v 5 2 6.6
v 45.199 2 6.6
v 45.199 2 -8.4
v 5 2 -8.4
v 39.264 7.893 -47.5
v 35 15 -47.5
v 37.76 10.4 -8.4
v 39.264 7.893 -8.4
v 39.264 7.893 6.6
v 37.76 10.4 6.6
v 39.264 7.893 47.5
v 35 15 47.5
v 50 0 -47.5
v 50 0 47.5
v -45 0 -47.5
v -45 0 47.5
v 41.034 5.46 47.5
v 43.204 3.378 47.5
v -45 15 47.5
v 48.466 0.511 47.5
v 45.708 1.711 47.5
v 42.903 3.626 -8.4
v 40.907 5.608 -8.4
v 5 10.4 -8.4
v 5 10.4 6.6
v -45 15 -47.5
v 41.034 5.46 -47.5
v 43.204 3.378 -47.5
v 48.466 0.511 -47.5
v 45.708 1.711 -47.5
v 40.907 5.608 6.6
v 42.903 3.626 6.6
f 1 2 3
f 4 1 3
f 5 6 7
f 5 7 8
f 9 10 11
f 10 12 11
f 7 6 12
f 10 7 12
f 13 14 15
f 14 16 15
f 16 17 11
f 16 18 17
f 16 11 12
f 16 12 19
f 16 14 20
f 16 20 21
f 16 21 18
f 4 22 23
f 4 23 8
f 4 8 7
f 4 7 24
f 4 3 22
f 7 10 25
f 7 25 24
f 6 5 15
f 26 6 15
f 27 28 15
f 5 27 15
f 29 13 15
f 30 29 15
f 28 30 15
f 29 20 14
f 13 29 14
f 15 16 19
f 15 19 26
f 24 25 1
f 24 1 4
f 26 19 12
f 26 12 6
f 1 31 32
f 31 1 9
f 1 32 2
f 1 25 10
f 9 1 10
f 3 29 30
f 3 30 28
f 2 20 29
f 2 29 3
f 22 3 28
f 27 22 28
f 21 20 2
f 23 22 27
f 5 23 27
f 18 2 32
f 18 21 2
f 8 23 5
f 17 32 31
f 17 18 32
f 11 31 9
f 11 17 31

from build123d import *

# Parameters (mm, degrees)
SKETCH1_W           = 90
SKETCH1_H           = 95
BOSS_EXTRUDE3_DEPTH = 15
SKETCH5_W           = 15
SKETCH5_H           = 8.4
CUT_EXTRUDE3_DEPTH  = 40
SKETCH7_W           = 95
SKETCH7_H           = 15
BOSS_EXTRUDE4_DEPTH = 5
CUT_EXTRUDE4_DEPTH  = 100
FILLET6_R           = 17


with BuildPart() as part:
    # Sketch1 → Boss-Extrude3 (new body)
    with BuildSketch(Plane(origin=(0, 0, 0), x_dir=(1, 0, 0), z_dir=(0, 1, 0))):
        Rectangle(SKETCH1_W, SKETCH1_H)
    extrude(amount=BOSS_EXTRUDE3_DEPTH)

    # Sketch5 → Cut-Extrude3 (cut)
    with BuildSketch(Plane(origin=(45, 0, 0), x_dir=(0, 0, -1), z_dir=(1, 0, 0))):
        with Locations((0.9, 6.2)):
            Rectangle(SKETCH5_W, SKETCH5_H)
    extrude(amount=-CUT_EXTRUDE3_DEPTH, mode=Mode.SUBTRACT)

    # Sketch7 → Boss-Extrude4 (add)
    with BuildSketch(Plane(origin=(45, 0, 0), x_dir=(0, 0, -1), z_dir=(1, 0, 0))):
        with Locations((0, 7.5)):
            Rectangle(SKETCH7_W, SKETCH7_H)
    extrude(amount=BOSS_EXTRUDE4_DEPTH)

    # Sketch8 → Cut-Extrude4 (cut)
    with BuildSketch(Plane.XY.offset(47.5)):
        Polygon((42.5, 2.5), (50, 0), (50, 15), (35, 15), align=None)
    extrude(amount=-CUT_EXTRUDE4_DEPTH, mode=Mode.SUBTRACT)

    # Fillet6
    # the kernel refuses this fillet: 17 mm, written as the material it adds along each edge
    with BuildSketch(Plane(origin=(42.5, 2.5, 7.321773239), x_dir=(0.9486832980505139, -0.316227766016838, 0), z_dir=(0, 0, -1))) as fillet6_piece_1_section:
        with BuildLine():
            CenterArc((FILLET6_R * 0.369924076215, -FILLET6_R), FILLET6_R, 90, 40.601294645)
            Line((-FILLET6_R * 0.28086729724, -FILLET6_R * 0.240743397635), (0, 0))
            Line((0, 0), (FILLET6_R * 0.369924076215, 0))
        make_face()
    fillet6_piece_1 = extrude(amount=54.821773239, mode=Mode.PRIVATE)
    fillet6_piece_1 = split(fillet6_piece_1, bisect_by=Plane(origin=(45.830299546, 2, 6.96088662), z_dir=(0, -1, 0)), keep=Keep.TOP, mode=Mode.PRIVATE)
    fillet6_piece_1 = split(fillet6_piece_1, bisect_by=Plane(origin=(45.830299546, 1.289116615, 6.6), z_dir=(0, 0, 1)), keep=Keep.TOP, mode=Mode.PRIVATE)
    add(fillet6_piece_1)
    with BuildSketch(Plane(origin=(42.5, 2.5, 7.321773239), x_dir=(0.9486832980505139, -0.316227766016838, 0), z_dir=(0, 0, -1))) as fillet6_piece_2_section:
        with BuildLine():
            CenterArc((FILLET6_R * 0.369924076215, -FILLET6_R), FILLET6_R, 90, 40.601294645)
            Line((-FILLET6_R * 0.28086729724, -FILLET6_R * 0.240743397635), (0, 0))
            Line((0, 0), (FILLET6_R * 0.369924076215, 0))
        make_face()
    fillet6_piece_2 = extrude(amount=54.821773239, mode=Mode.PRIVATE)
    fillet6_piece_2 = split(fillet6_piece_2, bisect_by=Plane(origin=(42.01228151, 2, 6.96088662), z_dir=(0, 1, 0)), keep=Keep.TOP, mode=Mode.PRIVATE)
    fillet6_piece_2 = split(fillet6_piece_2, bisect_by=Plane(origin=(42.01228151, 3.937960854, 6.6), z_dir=(0, 0, 1)), keep=Keep.TOP, mode=Mode.PRIVATE)
    add(fillet6_piece_2)
    with BuildSketch(Plane(origin=(42.5, 2.5, 7.321773239), x_dir=(0.9486832980505139, -0.316227766016838, 0), z_dir=(0, 0, -1))) as fillet6_piece_3_section:
        with BuildLine():
            CenterArc((FILLET6_R * 0.369924076215, -FILLET6_R), FILLET6_R, 90, 40.601294645)
            Line((-FILLET6_R * 0.28086729724, -FILLET6_R * 0.240743397635), (0, 0))
            Line((0, 0), (FILLET6_R * 0.369924076215, 0))
        make_face()
    fillet6_piece_3 = extrude(amount=54.821773239, mode=Mode.PRIVATE)
    fillet6_piece_3 = split(fillet6_piece_3, bisect_by=Plane(origin=(45.830299546, 1.289116615, -8.4), z_dir=(0, 0, 1)), keep=Keep.TOP, mode=Mode.PRIVATE)
    fillet6_piece_3 = split(fillet6_piece_3, bisect_by=Plane(origin=(45.830299546, 2, -0.9), z_dir=(0, -1, 0)), keep=Keep.TOP, mode=Mode.PRIVATE)
    fillet6_piece_3 = split(fillet6_piece_3, bisect_by=Plane(origin=(45.830299546, 1.289116615, 6.6), z_dir=(0, 0, -1)), keep=Keep.TOP, mode=Mode.PRIVATE)
    add(fillet6_piece_3)
    with BuildSketch(Plane(origin=(42.5, 2.5, -8.4), x_dir=(0.9486832980505139, -0.316227766016838, 0), z_dir=(0, 0, -1))) as fillet6_piece_4_section:
        with BuildLine():
            CenterArc((FILLET6_R * 0.369924076215, -FILLET6_R), FILLET6_R, 90, 40.601294645)
            Line((-FILLET6_R * 0.28086729724, -FILLET6_R * 0.240743397635), (0, 0))
            Line((0, 0), (FILLET6_R * 0.369924076215, 0))
        make_face()
    fillet6_piece_4 = extrude(amount=39.1, mode=Mode.PRIVATE)
    fillet6_piece_4 = split(fillet6_piece_4, bisect_by=Plane(origin=(45.830299546, 2, -27.95), z_dir=(0, -1, 0)), keep=Keep.TOP, mode=Mode.PRIVATE)
    add(fillet6_piece_4)
    with BuildSketch(Plane(origin=(42.5, 2.5, -8.4), x_dir=(0.9486832980505139, -0.316227766016838, 0), z_dir=(0, 0, -1))) as fillet6_piece_5_section:
        with BuildLine():
            CenterArc((FILLET6_R * 0.369924076215, -FILLET6_R), FILLET6_R, 90, 40.601294645)
            Line((-FILLET6_R * 0.28086729724, -FILLET6_R * 0.240743397635), (0, 0))
            Line((0, 0), (FILLET6_R * 0.369924076215, 0))
        make_face()
    fillet6_piece_5 = extrude(amount=39.1, mode=Mode.PRIVATE)
    fillet6_piece_5 = split(fillet6_piece_5, bisect_by=Plane(origin=(42.01228151, 2, -27.95), z_dir=(0, 1, 0)), keep=Keep.TOP, mode=Mode.PRIVATE)
    add(fillet6_piece_5)
    with BuildSketch(Plane(origin=(42.5, 2.5, 47.5), x_dir=(0.9486832980505139, -0.316227766016838, 0), z_dir=(0, 0, -1))) as fillet6_piece_6_section:
        with BuildLine():
            CenterArc((FILLET6_R * 0.369924076215, -FILLET6_R), FILLET6_R, 90, 40.601294645)
            Line((-FILLET6_R * 0.28086729724, -FILLET6_R * 0.240743397635), (0, 0))
            Line((0, 0), (FILLET6_R * 0.369924076215, 0))
        make_face()
    fillet6_piece_6 = extrude(amount=40.9, mode=Mode.PRIVATE)
    fillet6_piece_6 = split(fillet6_piece_6, bisect_by=Plane(origin=(45.830299546, 2, 27.05), z_dir=(0, -1, 0)), keep=Keep.TOP, mode=Mode.PRIVATE)
    add(fillet6_piece_6)
    with BuildSketch(Plane(origin=(42.5, 2.5, 47.5), x_dir=(0.9486832980505139, -0.316227766016838, 0), z_dir=(0, 0, -1))) as fillet6_piece_7_section:
        with BuildLine():
            CenterArc((FILLET6_R * 0.369924076215, -FILLET6_R), FILLET6_R, 90, 40.601294645)
            Line((-FILLET6_R * 0.28086729724, -FILLET6_R * 0.240743397635), (0, 0))
            Line((0, 0), (FILLET6_R * 0.369924076215, 0))
        make_face()
    fillet6_piece_7 = extrude(amount=40.9, mode=Mode.PRIVATE)
    fillet6_piece_7 = split(fillet6_piece_7, bisect_by=Plane(origin=(42.01228151, 2, 27.05), z_dir=(0, 1, 0)), keep=Keep.TOP, mode=Mode.PRIVATE)
    add(fillet6_piece_7)
    with BuildSketch(Plane(origin=(42.5, 2.5, 47.5), x_dir=(0.9486832980505139, -0.316227766016838, 0), z_dir=(0, 0, -1))) as fillet6_piece_8_section:
        with BuildLine():
            CenterArc((FILLET6_R * 0.369924076215, -FILLET6_R), FILLET6_R, 90, 40.601294645)
            Line((-FILLET6_R * 0.28086729724, -FILLET6_R * 0.240743397635), (0, 0))
            Line((0, 0), (FILLET6_R * 0.369924076215, 0))
        make_face()
    fillet6_piece_8 = extrude(amount=56.621773239, mode=Mode.PRIVATE)
    fillet6_piece_8 = split(fillet6_piece_8, bisect_by=Plane(origin=(45.830299546, 1.289116615, -8.4), z_dir=(0, 0, 1)), keep=Keep.TOP, mode=Mode.PRIVATE)
    fillet6_piece_8 = split(fillet6_piece_8, bisect_by=Plane(origin=(45.830299546, 2, -0.9), z_dir=(0, -1, 0)), keep=Keep.TOP, mode=Mode.PRIVATE)
    fillet6_piece_8 = split(fillet6_piece_8, bisect_by=Plane(origin=(45.830299546, 1.289116615, 6.6), z_dir=(0, 0, -1)), keep=Keep.TOP, mode=Mode.PRIVATE)
    add(fillet6_piece_8)
    with BuildSketch(Plane(origin=(42.5, 2.5, 47.5), x_dir=(0.9486832980505139, -0.316227766016838, 0), z_dir=(0, 0, -1))) as fillet6_piece_9_section:
        with BuildLine():
            CenterArc((FILLET6_R * 0.369924076215, -FILLET6_R), FILLET6_R, 90, 40.601294645)
            Line((-FILLET6_R * 0.28086729724, -FILLET6_R * 0.240743397635), (0, 0))
            Line((0, 0), (FILLET6_R * 0.369924076215, 0))
        make_face()
    fillet6_piece_9 = extrude(amount=56.621773239, mode=Mode.PRIVATE)
    fillet6_piece_9 = split(fillet6_piece_9, bisect_by=Plane(origin=(45.830299546, 1.289116615, -8.4), z_dir=(0, 0, -1)), keep=Keep.TOP, mode=Mode.PRIVATE)
    fillet6_piece_9 = split(fillet6_piece_9, bisect_by=Plane(origin=(45.830299546, 2, -8.76088662), z_dir=(0, -1, 0)), keep=Keep.TOP, mode=Mode.PRIVATE)
    add(fillet6_piece_9)
    with BuildSketch(Plane(origin=(42.5, 2.5, 47.5), x_dir=(0.9486832980505139, -0.316227766016838, 0), z_dir=(0, 0, -1))) as fillet6_piece_10_section:
        with BuildLine():
            CenterArc((FILLET6_R * 0.369924076215, -FILLET6_R), FILLET6_R, 90, 40.601294645)
            Line((-FILLET6_R * 0.28086729724, -FILLET6_R * 0.240743397635), (0, 0))
            Line((0, 0), (FILLET6_R * 0.369924076215, 0))
        make_face()
    fillet6_piece_10 = extrude(amount=56.621773239, mode=Mode.PRIVATE)
    fillet6_piece_10 = split(fillet6_piece_10, bisect_by=Plane(origin=(42.01228151, 3.937960854, -8.4), z_dir=(0, 0, -1)), keep=Keep.TOP, mode=Mode.PRIVATE)
    fillet6_piece_10 = split(fillet6_piece_10, bisect_by=Plane(origin=(42.01228151, 2, -8.76088662), z_dir=(0, 1, 0)), keep=Keep.TOP, mode=Mode.PRIVATE)
    add(fillet6_piece_10)


solid = part.part
